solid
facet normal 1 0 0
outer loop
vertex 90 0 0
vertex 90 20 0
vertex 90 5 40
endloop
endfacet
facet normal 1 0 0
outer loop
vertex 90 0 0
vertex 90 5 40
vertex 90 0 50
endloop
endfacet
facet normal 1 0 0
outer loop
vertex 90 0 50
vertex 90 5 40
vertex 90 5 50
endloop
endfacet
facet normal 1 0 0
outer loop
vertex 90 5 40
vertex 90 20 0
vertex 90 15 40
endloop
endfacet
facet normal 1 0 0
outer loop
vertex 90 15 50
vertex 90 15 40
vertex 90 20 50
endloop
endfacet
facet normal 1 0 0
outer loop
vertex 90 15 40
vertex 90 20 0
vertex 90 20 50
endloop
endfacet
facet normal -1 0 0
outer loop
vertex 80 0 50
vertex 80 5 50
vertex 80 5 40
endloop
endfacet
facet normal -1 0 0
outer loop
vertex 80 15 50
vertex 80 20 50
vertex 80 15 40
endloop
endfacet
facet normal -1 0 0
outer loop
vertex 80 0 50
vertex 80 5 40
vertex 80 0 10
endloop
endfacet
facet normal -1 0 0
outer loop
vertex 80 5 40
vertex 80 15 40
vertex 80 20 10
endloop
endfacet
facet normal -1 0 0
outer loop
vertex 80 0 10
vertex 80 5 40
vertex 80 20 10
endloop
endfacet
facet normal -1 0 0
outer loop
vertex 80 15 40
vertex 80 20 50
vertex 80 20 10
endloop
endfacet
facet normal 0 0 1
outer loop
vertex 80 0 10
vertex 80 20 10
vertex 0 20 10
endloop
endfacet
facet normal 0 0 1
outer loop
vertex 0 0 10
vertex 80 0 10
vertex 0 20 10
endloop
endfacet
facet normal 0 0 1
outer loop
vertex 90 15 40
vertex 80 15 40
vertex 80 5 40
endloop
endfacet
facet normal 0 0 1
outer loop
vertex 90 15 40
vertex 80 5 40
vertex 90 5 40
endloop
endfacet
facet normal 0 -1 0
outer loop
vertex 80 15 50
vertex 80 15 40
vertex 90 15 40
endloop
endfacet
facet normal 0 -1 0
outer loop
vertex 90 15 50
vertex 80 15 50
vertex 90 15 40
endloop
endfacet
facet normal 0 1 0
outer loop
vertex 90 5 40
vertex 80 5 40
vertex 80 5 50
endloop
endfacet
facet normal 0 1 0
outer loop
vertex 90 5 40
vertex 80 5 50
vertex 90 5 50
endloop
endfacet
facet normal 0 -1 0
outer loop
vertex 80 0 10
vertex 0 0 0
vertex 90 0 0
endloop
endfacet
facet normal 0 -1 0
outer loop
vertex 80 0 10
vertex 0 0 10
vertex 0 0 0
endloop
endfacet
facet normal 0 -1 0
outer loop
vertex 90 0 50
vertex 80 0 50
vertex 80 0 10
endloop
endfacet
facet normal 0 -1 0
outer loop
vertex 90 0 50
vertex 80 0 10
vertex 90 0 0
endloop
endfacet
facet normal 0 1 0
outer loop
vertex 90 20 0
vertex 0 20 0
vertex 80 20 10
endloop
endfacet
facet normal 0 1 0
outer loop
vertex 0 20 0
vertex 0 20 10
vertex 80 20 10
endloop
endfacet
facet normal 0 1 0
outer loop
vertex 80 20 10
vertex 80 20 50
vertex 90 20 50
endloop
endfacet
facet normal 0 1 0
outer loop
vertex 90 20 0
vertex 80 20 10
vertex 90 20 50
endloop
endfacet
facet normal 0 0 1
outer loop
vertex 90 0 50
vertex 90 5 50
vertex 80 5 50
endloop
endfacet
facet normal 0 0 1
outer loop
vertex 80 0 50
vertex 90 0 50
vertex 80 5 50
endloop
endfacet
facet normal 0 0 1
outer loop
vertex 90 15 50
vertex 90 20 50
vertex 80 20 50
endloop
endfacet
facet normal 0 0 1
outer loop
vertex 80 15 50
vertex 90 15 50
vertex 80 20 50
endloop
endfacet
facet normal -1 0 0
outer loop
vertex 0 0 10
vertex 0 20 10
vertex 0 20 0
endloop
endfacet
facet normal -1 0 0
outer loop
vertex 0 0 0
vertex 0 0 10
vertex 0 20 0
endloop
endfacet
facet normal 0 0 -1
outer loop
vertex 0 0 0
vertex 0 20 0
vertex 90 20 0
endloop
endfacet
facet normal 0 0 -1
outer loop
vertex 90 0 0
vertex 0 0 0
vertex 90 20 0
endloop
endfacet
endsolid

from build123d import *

# Parameters (mm, degrees)
BOX_W     = 20
BOX_H     = 10
BOX_DEPTH = 10
PAD_DEPTH = 20


with BuildPart() as cubo:
    # Box → Box (new body)
    with BuildSketch(Plane(origin=(76, 5, 40), x_dir=(1, 0, 0), z_dir=(0, 0, 1))):
        with Locations((10, 5)):
            Rectangle(BOX_W, BOX_H)
    extrude(amount=BOX_DEPTH)


with BuildPart() as cut001:
    # Sketch → Pad (new body)
    with BuildSketch(Plane.XZ):
        Polygon((0, 0), (90, 0), (90, 50), (80, 50), (80, 10), (0, 10), align=None)
    extrude(amount=PAD_DEPTH)


with BuildPart() as cut001_1:
    # Body placement: moved
    add(cut001.part.moved(Location((0, 20, 0))))

    # Cut001: cut Cubo
    add(cubo.part, mode=Mode.SUBTRACT)


solid = cut001_1.part
